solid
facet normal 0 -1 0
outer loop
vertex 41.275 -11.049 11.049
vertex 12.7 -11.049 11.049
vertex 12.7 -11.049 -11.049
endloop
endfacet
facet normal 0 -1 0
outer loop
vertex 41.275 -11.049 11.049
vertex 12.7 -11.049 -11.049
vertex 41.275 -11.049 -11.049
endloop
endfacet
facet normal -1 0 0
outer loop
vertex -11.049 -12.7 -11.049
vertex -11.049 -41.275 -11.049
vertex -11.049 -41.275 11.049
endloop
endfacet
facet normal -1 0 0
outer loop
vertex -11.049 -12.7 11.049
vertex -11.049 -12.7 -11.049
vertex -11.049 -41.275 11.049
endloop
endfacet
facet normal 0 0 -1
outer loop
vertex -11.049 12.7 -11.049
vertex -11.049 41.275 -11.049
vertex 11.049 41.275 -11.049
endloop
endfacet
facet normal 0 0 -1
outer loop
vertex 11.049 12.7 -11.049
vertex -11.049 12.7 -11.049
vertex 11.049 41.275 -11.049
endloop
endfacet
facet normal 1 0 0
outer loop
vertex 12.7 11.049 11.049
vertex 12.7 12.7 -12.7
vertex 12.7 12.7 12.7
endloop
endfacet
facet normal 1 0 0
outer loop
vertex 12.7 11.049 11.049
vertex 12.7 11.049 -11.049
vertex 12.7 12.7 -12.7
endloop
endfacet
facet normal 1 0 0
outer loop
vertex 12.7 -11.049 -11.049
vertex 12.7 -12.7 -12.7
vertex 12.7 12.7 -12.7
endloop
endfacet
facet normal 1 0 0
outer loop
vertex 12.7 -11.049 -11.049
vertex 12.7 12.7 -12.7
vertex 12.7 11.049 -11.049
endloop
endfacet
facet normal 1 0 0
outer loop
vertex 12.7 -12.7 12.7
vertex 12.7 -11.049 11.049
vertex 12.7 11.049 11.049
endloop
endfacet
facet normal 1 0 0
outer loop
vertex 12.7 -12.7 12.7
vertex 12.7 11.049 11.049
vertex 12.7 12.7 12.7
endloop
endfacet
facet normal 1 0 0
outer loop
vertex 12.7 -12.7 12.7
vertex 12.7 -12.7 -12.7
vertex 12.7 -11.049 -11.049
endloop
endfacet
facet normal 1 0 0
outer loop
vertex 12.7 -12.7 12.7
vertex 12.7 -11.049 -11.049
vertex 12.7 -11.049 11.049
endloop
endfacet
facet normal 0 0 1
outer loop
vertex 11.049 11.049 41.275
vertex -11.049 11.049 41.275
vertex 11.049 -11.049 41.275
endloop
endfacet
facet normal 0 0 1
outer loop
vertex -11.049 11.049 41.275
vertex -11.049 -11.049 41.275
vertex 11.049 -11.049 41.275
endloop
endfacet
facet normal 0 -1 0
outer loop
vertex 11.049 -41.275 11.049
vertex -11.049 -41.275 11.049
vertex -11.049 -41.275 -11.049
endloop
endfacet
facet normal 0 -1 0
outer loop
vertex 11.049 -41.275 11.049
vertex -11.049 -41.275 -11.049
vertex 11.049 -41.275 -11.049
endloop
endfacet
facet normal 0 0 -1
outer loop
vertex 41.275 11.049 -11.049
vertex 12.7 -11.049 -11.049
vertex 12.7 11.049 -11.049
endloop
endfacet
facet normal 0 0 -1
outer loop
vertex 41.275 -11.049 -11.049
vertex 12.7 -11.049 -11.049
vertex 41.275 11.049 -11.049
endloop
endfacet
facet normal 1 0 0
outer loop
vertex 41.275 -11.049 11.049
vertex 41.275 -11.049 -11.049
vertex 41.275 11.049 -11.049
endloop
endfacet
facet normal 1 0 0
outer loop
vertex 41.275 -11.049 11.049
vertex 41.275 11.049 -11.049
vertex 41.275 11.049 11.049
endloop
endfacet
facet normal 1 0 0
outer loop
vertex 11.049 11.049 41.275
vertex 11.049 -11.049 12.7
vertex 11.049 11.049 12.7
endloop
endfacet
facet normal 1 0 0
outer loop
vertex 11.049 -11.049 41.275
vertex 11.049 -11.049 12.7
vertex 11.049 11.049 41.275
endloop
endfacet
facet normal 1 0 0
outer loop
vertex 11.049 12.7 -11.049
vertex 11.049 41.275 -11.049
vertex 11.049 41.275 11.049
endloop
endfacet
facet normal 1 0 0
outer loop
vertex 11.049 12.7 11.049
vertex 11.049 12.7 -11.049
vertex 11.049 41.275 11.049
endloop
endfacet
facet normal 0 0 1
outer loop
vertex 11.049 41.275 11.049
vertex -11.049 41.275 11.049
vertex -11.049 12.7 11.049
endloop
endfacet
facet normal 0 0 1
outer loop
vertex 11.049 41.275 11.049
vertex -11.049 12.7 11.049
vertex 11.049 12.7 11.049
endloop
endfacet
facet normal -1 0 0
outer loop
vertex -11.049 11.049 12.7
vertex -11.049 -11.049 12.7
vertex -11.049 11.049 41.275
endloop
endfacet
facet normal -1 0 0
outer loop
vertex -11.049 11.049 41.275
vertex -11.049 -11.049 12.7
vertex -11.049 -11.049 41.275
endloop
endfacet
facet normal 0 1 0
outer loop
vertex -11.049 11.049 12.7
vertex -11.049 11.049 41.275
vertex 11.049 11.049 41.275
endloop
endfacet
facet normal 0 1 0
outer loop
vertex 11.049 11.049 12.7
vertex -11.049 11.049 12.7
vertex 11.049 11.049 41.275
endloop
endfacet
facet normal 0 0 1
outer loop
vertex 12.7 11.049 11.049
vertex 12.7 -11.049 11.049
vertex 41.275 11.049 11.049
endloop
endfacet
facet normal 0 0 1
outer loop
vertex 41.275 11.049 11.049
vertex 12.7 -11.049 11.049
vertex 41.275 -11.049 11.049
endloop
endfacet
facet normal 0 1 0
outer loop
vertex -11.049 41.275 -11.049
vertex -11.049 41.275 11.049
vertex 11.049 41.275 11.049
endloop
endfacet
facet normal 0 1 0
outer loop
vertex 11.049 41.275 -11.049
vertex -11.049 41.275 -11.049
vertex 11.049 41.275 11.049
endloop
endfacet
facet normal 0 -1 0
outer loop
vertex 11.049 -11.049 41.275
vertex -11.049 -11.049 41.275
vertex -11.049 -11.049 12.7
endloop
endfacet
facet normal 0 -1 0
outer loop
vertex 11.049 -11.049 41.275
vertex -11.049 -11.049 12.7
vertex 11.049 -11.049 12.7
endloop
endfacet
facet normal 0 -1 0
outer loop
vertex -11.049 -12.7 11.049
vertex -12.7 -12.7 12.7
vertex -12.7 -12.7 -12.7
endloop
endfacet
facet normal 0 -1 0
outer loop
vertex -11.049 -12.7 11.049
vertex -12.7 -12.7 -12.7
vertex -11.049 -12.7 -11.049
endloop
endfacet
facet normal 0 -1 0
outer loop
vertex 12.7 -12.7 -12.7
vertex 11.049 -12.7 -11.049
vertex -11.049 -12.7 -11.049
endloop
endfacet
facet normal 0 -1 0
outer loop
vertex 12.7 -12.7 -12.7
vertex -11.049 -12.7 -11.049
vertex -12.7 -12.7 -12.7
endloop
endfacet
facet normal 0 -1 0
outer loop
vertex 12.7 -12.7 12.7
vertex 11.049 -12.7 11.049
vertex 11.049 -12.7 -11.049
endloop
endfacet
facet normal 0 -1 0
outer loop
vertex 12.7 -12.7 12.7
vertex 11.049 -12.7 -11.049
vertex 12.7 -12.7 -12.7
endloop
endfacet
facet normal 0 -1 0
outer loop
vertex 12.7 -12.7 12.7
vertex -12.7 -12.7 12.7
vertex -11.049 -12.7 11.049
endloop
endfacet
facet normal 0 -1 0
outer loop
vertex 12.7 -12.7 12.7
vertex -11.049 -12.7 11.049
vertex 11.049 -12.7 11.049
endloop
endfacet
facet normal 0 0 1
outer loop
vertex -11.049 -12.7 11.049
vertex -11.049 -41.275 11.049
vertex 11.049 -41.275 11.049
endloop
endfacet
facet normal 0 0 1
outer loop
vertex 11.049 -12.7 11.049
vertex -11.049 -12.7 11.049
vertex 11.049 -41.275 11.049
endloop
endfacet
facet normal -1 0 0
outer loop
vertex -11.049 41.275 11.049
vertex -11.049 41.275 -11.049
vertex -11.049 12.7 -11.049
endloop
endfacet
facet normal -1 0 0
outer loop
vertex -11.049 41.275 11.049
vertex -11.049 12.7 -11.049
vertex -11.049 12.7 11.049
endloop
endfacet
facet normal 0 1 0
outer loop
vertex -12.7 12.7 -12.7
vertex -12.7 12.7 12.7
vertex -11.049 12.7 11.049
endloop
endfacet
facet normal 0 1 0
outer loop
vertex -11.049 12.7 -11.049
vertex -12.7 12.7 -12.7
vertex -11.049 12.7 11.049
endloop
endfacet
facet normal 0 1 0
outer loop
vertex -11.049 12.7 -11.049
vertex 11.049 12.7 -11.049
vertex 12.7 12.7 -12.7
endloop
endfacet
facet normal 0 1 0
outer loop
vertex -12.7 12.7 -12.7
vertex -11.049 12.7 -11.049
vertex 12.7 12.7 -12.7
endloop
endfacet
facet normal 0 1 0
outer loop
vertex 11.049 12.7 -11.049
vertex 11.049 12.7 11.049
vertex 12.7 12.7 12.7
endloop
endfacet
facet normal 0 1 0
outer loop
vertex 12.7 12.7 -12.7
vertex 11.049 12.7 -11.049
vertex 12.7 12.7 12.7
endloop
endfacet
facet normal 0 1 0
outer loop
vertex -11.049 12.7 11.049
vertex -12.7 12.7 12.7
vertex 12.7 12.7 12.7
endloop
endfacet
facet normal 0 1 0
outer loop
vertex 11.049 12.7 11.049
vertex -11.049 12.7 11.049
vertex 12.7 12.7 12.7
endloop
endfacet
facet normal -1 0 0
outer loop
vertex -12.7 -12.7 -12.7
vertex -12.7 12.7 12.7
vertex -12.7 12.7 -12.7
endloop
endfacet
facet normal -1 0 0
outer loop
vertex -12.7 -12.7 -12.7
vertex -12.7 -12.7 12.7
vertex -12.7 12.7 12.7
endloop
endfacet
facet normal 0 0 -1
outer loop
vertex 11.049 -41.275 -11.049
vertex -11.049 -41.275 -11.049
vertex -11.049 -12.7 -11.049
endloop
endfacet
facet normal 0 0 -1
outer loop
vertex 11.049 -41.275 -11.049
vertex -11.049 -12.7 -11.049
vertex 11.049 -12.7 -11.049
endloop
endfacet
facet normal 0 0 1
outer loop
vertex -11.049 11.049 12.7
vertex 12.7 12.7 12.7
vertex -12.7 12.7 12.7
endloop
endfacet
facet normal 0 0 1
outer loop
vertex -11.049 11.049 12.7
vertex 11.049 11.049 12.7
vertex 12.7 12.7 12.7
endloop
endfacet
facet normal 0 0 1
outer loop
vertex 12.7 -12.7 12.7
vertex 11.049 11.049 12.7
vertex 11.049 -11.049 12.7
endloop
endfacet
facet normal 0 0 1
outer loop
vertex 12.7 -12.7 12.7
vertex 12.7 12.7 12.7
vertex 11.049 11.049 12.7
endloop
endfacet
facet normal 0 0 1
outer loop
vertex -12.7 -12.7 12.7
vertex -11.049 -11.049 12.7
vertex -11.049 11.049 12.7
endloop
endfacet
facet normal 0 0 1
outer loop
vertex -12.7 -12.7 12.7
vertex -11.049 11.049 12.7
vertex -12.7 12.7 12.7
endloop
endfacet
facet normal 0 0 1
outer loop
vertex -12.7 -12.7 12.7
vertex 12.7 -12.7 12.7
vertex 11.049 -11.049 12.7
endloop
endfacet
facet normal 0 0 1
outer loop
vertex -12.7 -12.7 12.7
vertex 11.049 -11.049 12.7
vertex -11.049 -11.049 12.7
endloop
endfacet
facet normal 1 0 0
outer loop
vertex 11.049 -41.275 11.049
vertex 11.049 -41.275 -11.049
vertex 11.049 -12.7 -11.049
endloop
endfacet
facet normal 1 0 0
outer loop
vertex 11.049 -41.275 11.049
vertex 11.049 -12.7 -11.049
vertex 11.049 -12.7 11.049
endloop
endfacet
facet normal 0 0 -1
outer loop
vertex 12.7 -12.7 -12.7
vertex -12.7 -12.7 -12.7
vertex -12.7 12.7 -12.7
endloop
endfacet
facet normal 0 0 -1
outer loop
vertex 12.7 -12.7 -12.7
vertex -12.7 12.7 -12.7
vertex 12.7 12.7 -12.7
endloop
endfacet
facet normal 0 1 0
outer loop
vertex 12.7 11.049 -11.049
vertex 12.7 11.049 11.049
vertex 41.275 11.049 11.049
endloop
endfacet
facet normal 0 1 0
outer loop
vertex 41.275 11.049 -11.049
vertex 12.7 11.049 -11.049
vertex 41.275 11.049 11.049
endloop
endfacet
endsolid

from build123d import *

# Parameters (mm, degrees)
F0_W     = 22.098
F0_H     = 22.098
F1_DEPTH = 41.275
F2_DEPTH = 12.7
F0_H_2   = 28.575
F3_DEPTH = 11.049
F0_W_2   = 28.575
F4_DEPTH = 11.049


with BuildPart() as f1:
    # F0 (on Front) → F1 (new body, symmetric)
    with BuildSketch(Plane.XZ):
        Rectangle(F0_W, F0_H)
    extrude(amount=F1_DEPTH, both=True)

    # F0 (on Front) → F2 (join, symmetric)
    with BuildSketch(Plane.XZ):
        Polygon((-11.049, 12.7), (-12.7, 12.7), (-12.7, -12.7), (12.7, -12.7), (12.7, -11.049), (12.7, 11.049), (12.7, 12.7), (11.049, 12.7), align=None)
        Rectangle(F0_W, F0_H, mode=Mode.SUBTRACT)
        Rectangle(F0_W, F0_H)
    extrude(amount=F2_DEPTH, both=True)

    # F0 (on Front) → F3 (join, symmetric)
    with BuildSketch(Plane.XZ):
        with Locations((0, 26.9875)):
            Rectangle(F0_W, F0_H_2)
    extrude(amount=F3_DEPTH, both=True)

    # F0 (on Front) → F4 (join, symmetric)
    with BuildSketch(Plane.XZ):
        with Locations((26.9875, 0)):
            Rectangle(F0_W_2, F0_H)
    extrude(amount=F4_DEPTH, both=True)


solid = f1.part
